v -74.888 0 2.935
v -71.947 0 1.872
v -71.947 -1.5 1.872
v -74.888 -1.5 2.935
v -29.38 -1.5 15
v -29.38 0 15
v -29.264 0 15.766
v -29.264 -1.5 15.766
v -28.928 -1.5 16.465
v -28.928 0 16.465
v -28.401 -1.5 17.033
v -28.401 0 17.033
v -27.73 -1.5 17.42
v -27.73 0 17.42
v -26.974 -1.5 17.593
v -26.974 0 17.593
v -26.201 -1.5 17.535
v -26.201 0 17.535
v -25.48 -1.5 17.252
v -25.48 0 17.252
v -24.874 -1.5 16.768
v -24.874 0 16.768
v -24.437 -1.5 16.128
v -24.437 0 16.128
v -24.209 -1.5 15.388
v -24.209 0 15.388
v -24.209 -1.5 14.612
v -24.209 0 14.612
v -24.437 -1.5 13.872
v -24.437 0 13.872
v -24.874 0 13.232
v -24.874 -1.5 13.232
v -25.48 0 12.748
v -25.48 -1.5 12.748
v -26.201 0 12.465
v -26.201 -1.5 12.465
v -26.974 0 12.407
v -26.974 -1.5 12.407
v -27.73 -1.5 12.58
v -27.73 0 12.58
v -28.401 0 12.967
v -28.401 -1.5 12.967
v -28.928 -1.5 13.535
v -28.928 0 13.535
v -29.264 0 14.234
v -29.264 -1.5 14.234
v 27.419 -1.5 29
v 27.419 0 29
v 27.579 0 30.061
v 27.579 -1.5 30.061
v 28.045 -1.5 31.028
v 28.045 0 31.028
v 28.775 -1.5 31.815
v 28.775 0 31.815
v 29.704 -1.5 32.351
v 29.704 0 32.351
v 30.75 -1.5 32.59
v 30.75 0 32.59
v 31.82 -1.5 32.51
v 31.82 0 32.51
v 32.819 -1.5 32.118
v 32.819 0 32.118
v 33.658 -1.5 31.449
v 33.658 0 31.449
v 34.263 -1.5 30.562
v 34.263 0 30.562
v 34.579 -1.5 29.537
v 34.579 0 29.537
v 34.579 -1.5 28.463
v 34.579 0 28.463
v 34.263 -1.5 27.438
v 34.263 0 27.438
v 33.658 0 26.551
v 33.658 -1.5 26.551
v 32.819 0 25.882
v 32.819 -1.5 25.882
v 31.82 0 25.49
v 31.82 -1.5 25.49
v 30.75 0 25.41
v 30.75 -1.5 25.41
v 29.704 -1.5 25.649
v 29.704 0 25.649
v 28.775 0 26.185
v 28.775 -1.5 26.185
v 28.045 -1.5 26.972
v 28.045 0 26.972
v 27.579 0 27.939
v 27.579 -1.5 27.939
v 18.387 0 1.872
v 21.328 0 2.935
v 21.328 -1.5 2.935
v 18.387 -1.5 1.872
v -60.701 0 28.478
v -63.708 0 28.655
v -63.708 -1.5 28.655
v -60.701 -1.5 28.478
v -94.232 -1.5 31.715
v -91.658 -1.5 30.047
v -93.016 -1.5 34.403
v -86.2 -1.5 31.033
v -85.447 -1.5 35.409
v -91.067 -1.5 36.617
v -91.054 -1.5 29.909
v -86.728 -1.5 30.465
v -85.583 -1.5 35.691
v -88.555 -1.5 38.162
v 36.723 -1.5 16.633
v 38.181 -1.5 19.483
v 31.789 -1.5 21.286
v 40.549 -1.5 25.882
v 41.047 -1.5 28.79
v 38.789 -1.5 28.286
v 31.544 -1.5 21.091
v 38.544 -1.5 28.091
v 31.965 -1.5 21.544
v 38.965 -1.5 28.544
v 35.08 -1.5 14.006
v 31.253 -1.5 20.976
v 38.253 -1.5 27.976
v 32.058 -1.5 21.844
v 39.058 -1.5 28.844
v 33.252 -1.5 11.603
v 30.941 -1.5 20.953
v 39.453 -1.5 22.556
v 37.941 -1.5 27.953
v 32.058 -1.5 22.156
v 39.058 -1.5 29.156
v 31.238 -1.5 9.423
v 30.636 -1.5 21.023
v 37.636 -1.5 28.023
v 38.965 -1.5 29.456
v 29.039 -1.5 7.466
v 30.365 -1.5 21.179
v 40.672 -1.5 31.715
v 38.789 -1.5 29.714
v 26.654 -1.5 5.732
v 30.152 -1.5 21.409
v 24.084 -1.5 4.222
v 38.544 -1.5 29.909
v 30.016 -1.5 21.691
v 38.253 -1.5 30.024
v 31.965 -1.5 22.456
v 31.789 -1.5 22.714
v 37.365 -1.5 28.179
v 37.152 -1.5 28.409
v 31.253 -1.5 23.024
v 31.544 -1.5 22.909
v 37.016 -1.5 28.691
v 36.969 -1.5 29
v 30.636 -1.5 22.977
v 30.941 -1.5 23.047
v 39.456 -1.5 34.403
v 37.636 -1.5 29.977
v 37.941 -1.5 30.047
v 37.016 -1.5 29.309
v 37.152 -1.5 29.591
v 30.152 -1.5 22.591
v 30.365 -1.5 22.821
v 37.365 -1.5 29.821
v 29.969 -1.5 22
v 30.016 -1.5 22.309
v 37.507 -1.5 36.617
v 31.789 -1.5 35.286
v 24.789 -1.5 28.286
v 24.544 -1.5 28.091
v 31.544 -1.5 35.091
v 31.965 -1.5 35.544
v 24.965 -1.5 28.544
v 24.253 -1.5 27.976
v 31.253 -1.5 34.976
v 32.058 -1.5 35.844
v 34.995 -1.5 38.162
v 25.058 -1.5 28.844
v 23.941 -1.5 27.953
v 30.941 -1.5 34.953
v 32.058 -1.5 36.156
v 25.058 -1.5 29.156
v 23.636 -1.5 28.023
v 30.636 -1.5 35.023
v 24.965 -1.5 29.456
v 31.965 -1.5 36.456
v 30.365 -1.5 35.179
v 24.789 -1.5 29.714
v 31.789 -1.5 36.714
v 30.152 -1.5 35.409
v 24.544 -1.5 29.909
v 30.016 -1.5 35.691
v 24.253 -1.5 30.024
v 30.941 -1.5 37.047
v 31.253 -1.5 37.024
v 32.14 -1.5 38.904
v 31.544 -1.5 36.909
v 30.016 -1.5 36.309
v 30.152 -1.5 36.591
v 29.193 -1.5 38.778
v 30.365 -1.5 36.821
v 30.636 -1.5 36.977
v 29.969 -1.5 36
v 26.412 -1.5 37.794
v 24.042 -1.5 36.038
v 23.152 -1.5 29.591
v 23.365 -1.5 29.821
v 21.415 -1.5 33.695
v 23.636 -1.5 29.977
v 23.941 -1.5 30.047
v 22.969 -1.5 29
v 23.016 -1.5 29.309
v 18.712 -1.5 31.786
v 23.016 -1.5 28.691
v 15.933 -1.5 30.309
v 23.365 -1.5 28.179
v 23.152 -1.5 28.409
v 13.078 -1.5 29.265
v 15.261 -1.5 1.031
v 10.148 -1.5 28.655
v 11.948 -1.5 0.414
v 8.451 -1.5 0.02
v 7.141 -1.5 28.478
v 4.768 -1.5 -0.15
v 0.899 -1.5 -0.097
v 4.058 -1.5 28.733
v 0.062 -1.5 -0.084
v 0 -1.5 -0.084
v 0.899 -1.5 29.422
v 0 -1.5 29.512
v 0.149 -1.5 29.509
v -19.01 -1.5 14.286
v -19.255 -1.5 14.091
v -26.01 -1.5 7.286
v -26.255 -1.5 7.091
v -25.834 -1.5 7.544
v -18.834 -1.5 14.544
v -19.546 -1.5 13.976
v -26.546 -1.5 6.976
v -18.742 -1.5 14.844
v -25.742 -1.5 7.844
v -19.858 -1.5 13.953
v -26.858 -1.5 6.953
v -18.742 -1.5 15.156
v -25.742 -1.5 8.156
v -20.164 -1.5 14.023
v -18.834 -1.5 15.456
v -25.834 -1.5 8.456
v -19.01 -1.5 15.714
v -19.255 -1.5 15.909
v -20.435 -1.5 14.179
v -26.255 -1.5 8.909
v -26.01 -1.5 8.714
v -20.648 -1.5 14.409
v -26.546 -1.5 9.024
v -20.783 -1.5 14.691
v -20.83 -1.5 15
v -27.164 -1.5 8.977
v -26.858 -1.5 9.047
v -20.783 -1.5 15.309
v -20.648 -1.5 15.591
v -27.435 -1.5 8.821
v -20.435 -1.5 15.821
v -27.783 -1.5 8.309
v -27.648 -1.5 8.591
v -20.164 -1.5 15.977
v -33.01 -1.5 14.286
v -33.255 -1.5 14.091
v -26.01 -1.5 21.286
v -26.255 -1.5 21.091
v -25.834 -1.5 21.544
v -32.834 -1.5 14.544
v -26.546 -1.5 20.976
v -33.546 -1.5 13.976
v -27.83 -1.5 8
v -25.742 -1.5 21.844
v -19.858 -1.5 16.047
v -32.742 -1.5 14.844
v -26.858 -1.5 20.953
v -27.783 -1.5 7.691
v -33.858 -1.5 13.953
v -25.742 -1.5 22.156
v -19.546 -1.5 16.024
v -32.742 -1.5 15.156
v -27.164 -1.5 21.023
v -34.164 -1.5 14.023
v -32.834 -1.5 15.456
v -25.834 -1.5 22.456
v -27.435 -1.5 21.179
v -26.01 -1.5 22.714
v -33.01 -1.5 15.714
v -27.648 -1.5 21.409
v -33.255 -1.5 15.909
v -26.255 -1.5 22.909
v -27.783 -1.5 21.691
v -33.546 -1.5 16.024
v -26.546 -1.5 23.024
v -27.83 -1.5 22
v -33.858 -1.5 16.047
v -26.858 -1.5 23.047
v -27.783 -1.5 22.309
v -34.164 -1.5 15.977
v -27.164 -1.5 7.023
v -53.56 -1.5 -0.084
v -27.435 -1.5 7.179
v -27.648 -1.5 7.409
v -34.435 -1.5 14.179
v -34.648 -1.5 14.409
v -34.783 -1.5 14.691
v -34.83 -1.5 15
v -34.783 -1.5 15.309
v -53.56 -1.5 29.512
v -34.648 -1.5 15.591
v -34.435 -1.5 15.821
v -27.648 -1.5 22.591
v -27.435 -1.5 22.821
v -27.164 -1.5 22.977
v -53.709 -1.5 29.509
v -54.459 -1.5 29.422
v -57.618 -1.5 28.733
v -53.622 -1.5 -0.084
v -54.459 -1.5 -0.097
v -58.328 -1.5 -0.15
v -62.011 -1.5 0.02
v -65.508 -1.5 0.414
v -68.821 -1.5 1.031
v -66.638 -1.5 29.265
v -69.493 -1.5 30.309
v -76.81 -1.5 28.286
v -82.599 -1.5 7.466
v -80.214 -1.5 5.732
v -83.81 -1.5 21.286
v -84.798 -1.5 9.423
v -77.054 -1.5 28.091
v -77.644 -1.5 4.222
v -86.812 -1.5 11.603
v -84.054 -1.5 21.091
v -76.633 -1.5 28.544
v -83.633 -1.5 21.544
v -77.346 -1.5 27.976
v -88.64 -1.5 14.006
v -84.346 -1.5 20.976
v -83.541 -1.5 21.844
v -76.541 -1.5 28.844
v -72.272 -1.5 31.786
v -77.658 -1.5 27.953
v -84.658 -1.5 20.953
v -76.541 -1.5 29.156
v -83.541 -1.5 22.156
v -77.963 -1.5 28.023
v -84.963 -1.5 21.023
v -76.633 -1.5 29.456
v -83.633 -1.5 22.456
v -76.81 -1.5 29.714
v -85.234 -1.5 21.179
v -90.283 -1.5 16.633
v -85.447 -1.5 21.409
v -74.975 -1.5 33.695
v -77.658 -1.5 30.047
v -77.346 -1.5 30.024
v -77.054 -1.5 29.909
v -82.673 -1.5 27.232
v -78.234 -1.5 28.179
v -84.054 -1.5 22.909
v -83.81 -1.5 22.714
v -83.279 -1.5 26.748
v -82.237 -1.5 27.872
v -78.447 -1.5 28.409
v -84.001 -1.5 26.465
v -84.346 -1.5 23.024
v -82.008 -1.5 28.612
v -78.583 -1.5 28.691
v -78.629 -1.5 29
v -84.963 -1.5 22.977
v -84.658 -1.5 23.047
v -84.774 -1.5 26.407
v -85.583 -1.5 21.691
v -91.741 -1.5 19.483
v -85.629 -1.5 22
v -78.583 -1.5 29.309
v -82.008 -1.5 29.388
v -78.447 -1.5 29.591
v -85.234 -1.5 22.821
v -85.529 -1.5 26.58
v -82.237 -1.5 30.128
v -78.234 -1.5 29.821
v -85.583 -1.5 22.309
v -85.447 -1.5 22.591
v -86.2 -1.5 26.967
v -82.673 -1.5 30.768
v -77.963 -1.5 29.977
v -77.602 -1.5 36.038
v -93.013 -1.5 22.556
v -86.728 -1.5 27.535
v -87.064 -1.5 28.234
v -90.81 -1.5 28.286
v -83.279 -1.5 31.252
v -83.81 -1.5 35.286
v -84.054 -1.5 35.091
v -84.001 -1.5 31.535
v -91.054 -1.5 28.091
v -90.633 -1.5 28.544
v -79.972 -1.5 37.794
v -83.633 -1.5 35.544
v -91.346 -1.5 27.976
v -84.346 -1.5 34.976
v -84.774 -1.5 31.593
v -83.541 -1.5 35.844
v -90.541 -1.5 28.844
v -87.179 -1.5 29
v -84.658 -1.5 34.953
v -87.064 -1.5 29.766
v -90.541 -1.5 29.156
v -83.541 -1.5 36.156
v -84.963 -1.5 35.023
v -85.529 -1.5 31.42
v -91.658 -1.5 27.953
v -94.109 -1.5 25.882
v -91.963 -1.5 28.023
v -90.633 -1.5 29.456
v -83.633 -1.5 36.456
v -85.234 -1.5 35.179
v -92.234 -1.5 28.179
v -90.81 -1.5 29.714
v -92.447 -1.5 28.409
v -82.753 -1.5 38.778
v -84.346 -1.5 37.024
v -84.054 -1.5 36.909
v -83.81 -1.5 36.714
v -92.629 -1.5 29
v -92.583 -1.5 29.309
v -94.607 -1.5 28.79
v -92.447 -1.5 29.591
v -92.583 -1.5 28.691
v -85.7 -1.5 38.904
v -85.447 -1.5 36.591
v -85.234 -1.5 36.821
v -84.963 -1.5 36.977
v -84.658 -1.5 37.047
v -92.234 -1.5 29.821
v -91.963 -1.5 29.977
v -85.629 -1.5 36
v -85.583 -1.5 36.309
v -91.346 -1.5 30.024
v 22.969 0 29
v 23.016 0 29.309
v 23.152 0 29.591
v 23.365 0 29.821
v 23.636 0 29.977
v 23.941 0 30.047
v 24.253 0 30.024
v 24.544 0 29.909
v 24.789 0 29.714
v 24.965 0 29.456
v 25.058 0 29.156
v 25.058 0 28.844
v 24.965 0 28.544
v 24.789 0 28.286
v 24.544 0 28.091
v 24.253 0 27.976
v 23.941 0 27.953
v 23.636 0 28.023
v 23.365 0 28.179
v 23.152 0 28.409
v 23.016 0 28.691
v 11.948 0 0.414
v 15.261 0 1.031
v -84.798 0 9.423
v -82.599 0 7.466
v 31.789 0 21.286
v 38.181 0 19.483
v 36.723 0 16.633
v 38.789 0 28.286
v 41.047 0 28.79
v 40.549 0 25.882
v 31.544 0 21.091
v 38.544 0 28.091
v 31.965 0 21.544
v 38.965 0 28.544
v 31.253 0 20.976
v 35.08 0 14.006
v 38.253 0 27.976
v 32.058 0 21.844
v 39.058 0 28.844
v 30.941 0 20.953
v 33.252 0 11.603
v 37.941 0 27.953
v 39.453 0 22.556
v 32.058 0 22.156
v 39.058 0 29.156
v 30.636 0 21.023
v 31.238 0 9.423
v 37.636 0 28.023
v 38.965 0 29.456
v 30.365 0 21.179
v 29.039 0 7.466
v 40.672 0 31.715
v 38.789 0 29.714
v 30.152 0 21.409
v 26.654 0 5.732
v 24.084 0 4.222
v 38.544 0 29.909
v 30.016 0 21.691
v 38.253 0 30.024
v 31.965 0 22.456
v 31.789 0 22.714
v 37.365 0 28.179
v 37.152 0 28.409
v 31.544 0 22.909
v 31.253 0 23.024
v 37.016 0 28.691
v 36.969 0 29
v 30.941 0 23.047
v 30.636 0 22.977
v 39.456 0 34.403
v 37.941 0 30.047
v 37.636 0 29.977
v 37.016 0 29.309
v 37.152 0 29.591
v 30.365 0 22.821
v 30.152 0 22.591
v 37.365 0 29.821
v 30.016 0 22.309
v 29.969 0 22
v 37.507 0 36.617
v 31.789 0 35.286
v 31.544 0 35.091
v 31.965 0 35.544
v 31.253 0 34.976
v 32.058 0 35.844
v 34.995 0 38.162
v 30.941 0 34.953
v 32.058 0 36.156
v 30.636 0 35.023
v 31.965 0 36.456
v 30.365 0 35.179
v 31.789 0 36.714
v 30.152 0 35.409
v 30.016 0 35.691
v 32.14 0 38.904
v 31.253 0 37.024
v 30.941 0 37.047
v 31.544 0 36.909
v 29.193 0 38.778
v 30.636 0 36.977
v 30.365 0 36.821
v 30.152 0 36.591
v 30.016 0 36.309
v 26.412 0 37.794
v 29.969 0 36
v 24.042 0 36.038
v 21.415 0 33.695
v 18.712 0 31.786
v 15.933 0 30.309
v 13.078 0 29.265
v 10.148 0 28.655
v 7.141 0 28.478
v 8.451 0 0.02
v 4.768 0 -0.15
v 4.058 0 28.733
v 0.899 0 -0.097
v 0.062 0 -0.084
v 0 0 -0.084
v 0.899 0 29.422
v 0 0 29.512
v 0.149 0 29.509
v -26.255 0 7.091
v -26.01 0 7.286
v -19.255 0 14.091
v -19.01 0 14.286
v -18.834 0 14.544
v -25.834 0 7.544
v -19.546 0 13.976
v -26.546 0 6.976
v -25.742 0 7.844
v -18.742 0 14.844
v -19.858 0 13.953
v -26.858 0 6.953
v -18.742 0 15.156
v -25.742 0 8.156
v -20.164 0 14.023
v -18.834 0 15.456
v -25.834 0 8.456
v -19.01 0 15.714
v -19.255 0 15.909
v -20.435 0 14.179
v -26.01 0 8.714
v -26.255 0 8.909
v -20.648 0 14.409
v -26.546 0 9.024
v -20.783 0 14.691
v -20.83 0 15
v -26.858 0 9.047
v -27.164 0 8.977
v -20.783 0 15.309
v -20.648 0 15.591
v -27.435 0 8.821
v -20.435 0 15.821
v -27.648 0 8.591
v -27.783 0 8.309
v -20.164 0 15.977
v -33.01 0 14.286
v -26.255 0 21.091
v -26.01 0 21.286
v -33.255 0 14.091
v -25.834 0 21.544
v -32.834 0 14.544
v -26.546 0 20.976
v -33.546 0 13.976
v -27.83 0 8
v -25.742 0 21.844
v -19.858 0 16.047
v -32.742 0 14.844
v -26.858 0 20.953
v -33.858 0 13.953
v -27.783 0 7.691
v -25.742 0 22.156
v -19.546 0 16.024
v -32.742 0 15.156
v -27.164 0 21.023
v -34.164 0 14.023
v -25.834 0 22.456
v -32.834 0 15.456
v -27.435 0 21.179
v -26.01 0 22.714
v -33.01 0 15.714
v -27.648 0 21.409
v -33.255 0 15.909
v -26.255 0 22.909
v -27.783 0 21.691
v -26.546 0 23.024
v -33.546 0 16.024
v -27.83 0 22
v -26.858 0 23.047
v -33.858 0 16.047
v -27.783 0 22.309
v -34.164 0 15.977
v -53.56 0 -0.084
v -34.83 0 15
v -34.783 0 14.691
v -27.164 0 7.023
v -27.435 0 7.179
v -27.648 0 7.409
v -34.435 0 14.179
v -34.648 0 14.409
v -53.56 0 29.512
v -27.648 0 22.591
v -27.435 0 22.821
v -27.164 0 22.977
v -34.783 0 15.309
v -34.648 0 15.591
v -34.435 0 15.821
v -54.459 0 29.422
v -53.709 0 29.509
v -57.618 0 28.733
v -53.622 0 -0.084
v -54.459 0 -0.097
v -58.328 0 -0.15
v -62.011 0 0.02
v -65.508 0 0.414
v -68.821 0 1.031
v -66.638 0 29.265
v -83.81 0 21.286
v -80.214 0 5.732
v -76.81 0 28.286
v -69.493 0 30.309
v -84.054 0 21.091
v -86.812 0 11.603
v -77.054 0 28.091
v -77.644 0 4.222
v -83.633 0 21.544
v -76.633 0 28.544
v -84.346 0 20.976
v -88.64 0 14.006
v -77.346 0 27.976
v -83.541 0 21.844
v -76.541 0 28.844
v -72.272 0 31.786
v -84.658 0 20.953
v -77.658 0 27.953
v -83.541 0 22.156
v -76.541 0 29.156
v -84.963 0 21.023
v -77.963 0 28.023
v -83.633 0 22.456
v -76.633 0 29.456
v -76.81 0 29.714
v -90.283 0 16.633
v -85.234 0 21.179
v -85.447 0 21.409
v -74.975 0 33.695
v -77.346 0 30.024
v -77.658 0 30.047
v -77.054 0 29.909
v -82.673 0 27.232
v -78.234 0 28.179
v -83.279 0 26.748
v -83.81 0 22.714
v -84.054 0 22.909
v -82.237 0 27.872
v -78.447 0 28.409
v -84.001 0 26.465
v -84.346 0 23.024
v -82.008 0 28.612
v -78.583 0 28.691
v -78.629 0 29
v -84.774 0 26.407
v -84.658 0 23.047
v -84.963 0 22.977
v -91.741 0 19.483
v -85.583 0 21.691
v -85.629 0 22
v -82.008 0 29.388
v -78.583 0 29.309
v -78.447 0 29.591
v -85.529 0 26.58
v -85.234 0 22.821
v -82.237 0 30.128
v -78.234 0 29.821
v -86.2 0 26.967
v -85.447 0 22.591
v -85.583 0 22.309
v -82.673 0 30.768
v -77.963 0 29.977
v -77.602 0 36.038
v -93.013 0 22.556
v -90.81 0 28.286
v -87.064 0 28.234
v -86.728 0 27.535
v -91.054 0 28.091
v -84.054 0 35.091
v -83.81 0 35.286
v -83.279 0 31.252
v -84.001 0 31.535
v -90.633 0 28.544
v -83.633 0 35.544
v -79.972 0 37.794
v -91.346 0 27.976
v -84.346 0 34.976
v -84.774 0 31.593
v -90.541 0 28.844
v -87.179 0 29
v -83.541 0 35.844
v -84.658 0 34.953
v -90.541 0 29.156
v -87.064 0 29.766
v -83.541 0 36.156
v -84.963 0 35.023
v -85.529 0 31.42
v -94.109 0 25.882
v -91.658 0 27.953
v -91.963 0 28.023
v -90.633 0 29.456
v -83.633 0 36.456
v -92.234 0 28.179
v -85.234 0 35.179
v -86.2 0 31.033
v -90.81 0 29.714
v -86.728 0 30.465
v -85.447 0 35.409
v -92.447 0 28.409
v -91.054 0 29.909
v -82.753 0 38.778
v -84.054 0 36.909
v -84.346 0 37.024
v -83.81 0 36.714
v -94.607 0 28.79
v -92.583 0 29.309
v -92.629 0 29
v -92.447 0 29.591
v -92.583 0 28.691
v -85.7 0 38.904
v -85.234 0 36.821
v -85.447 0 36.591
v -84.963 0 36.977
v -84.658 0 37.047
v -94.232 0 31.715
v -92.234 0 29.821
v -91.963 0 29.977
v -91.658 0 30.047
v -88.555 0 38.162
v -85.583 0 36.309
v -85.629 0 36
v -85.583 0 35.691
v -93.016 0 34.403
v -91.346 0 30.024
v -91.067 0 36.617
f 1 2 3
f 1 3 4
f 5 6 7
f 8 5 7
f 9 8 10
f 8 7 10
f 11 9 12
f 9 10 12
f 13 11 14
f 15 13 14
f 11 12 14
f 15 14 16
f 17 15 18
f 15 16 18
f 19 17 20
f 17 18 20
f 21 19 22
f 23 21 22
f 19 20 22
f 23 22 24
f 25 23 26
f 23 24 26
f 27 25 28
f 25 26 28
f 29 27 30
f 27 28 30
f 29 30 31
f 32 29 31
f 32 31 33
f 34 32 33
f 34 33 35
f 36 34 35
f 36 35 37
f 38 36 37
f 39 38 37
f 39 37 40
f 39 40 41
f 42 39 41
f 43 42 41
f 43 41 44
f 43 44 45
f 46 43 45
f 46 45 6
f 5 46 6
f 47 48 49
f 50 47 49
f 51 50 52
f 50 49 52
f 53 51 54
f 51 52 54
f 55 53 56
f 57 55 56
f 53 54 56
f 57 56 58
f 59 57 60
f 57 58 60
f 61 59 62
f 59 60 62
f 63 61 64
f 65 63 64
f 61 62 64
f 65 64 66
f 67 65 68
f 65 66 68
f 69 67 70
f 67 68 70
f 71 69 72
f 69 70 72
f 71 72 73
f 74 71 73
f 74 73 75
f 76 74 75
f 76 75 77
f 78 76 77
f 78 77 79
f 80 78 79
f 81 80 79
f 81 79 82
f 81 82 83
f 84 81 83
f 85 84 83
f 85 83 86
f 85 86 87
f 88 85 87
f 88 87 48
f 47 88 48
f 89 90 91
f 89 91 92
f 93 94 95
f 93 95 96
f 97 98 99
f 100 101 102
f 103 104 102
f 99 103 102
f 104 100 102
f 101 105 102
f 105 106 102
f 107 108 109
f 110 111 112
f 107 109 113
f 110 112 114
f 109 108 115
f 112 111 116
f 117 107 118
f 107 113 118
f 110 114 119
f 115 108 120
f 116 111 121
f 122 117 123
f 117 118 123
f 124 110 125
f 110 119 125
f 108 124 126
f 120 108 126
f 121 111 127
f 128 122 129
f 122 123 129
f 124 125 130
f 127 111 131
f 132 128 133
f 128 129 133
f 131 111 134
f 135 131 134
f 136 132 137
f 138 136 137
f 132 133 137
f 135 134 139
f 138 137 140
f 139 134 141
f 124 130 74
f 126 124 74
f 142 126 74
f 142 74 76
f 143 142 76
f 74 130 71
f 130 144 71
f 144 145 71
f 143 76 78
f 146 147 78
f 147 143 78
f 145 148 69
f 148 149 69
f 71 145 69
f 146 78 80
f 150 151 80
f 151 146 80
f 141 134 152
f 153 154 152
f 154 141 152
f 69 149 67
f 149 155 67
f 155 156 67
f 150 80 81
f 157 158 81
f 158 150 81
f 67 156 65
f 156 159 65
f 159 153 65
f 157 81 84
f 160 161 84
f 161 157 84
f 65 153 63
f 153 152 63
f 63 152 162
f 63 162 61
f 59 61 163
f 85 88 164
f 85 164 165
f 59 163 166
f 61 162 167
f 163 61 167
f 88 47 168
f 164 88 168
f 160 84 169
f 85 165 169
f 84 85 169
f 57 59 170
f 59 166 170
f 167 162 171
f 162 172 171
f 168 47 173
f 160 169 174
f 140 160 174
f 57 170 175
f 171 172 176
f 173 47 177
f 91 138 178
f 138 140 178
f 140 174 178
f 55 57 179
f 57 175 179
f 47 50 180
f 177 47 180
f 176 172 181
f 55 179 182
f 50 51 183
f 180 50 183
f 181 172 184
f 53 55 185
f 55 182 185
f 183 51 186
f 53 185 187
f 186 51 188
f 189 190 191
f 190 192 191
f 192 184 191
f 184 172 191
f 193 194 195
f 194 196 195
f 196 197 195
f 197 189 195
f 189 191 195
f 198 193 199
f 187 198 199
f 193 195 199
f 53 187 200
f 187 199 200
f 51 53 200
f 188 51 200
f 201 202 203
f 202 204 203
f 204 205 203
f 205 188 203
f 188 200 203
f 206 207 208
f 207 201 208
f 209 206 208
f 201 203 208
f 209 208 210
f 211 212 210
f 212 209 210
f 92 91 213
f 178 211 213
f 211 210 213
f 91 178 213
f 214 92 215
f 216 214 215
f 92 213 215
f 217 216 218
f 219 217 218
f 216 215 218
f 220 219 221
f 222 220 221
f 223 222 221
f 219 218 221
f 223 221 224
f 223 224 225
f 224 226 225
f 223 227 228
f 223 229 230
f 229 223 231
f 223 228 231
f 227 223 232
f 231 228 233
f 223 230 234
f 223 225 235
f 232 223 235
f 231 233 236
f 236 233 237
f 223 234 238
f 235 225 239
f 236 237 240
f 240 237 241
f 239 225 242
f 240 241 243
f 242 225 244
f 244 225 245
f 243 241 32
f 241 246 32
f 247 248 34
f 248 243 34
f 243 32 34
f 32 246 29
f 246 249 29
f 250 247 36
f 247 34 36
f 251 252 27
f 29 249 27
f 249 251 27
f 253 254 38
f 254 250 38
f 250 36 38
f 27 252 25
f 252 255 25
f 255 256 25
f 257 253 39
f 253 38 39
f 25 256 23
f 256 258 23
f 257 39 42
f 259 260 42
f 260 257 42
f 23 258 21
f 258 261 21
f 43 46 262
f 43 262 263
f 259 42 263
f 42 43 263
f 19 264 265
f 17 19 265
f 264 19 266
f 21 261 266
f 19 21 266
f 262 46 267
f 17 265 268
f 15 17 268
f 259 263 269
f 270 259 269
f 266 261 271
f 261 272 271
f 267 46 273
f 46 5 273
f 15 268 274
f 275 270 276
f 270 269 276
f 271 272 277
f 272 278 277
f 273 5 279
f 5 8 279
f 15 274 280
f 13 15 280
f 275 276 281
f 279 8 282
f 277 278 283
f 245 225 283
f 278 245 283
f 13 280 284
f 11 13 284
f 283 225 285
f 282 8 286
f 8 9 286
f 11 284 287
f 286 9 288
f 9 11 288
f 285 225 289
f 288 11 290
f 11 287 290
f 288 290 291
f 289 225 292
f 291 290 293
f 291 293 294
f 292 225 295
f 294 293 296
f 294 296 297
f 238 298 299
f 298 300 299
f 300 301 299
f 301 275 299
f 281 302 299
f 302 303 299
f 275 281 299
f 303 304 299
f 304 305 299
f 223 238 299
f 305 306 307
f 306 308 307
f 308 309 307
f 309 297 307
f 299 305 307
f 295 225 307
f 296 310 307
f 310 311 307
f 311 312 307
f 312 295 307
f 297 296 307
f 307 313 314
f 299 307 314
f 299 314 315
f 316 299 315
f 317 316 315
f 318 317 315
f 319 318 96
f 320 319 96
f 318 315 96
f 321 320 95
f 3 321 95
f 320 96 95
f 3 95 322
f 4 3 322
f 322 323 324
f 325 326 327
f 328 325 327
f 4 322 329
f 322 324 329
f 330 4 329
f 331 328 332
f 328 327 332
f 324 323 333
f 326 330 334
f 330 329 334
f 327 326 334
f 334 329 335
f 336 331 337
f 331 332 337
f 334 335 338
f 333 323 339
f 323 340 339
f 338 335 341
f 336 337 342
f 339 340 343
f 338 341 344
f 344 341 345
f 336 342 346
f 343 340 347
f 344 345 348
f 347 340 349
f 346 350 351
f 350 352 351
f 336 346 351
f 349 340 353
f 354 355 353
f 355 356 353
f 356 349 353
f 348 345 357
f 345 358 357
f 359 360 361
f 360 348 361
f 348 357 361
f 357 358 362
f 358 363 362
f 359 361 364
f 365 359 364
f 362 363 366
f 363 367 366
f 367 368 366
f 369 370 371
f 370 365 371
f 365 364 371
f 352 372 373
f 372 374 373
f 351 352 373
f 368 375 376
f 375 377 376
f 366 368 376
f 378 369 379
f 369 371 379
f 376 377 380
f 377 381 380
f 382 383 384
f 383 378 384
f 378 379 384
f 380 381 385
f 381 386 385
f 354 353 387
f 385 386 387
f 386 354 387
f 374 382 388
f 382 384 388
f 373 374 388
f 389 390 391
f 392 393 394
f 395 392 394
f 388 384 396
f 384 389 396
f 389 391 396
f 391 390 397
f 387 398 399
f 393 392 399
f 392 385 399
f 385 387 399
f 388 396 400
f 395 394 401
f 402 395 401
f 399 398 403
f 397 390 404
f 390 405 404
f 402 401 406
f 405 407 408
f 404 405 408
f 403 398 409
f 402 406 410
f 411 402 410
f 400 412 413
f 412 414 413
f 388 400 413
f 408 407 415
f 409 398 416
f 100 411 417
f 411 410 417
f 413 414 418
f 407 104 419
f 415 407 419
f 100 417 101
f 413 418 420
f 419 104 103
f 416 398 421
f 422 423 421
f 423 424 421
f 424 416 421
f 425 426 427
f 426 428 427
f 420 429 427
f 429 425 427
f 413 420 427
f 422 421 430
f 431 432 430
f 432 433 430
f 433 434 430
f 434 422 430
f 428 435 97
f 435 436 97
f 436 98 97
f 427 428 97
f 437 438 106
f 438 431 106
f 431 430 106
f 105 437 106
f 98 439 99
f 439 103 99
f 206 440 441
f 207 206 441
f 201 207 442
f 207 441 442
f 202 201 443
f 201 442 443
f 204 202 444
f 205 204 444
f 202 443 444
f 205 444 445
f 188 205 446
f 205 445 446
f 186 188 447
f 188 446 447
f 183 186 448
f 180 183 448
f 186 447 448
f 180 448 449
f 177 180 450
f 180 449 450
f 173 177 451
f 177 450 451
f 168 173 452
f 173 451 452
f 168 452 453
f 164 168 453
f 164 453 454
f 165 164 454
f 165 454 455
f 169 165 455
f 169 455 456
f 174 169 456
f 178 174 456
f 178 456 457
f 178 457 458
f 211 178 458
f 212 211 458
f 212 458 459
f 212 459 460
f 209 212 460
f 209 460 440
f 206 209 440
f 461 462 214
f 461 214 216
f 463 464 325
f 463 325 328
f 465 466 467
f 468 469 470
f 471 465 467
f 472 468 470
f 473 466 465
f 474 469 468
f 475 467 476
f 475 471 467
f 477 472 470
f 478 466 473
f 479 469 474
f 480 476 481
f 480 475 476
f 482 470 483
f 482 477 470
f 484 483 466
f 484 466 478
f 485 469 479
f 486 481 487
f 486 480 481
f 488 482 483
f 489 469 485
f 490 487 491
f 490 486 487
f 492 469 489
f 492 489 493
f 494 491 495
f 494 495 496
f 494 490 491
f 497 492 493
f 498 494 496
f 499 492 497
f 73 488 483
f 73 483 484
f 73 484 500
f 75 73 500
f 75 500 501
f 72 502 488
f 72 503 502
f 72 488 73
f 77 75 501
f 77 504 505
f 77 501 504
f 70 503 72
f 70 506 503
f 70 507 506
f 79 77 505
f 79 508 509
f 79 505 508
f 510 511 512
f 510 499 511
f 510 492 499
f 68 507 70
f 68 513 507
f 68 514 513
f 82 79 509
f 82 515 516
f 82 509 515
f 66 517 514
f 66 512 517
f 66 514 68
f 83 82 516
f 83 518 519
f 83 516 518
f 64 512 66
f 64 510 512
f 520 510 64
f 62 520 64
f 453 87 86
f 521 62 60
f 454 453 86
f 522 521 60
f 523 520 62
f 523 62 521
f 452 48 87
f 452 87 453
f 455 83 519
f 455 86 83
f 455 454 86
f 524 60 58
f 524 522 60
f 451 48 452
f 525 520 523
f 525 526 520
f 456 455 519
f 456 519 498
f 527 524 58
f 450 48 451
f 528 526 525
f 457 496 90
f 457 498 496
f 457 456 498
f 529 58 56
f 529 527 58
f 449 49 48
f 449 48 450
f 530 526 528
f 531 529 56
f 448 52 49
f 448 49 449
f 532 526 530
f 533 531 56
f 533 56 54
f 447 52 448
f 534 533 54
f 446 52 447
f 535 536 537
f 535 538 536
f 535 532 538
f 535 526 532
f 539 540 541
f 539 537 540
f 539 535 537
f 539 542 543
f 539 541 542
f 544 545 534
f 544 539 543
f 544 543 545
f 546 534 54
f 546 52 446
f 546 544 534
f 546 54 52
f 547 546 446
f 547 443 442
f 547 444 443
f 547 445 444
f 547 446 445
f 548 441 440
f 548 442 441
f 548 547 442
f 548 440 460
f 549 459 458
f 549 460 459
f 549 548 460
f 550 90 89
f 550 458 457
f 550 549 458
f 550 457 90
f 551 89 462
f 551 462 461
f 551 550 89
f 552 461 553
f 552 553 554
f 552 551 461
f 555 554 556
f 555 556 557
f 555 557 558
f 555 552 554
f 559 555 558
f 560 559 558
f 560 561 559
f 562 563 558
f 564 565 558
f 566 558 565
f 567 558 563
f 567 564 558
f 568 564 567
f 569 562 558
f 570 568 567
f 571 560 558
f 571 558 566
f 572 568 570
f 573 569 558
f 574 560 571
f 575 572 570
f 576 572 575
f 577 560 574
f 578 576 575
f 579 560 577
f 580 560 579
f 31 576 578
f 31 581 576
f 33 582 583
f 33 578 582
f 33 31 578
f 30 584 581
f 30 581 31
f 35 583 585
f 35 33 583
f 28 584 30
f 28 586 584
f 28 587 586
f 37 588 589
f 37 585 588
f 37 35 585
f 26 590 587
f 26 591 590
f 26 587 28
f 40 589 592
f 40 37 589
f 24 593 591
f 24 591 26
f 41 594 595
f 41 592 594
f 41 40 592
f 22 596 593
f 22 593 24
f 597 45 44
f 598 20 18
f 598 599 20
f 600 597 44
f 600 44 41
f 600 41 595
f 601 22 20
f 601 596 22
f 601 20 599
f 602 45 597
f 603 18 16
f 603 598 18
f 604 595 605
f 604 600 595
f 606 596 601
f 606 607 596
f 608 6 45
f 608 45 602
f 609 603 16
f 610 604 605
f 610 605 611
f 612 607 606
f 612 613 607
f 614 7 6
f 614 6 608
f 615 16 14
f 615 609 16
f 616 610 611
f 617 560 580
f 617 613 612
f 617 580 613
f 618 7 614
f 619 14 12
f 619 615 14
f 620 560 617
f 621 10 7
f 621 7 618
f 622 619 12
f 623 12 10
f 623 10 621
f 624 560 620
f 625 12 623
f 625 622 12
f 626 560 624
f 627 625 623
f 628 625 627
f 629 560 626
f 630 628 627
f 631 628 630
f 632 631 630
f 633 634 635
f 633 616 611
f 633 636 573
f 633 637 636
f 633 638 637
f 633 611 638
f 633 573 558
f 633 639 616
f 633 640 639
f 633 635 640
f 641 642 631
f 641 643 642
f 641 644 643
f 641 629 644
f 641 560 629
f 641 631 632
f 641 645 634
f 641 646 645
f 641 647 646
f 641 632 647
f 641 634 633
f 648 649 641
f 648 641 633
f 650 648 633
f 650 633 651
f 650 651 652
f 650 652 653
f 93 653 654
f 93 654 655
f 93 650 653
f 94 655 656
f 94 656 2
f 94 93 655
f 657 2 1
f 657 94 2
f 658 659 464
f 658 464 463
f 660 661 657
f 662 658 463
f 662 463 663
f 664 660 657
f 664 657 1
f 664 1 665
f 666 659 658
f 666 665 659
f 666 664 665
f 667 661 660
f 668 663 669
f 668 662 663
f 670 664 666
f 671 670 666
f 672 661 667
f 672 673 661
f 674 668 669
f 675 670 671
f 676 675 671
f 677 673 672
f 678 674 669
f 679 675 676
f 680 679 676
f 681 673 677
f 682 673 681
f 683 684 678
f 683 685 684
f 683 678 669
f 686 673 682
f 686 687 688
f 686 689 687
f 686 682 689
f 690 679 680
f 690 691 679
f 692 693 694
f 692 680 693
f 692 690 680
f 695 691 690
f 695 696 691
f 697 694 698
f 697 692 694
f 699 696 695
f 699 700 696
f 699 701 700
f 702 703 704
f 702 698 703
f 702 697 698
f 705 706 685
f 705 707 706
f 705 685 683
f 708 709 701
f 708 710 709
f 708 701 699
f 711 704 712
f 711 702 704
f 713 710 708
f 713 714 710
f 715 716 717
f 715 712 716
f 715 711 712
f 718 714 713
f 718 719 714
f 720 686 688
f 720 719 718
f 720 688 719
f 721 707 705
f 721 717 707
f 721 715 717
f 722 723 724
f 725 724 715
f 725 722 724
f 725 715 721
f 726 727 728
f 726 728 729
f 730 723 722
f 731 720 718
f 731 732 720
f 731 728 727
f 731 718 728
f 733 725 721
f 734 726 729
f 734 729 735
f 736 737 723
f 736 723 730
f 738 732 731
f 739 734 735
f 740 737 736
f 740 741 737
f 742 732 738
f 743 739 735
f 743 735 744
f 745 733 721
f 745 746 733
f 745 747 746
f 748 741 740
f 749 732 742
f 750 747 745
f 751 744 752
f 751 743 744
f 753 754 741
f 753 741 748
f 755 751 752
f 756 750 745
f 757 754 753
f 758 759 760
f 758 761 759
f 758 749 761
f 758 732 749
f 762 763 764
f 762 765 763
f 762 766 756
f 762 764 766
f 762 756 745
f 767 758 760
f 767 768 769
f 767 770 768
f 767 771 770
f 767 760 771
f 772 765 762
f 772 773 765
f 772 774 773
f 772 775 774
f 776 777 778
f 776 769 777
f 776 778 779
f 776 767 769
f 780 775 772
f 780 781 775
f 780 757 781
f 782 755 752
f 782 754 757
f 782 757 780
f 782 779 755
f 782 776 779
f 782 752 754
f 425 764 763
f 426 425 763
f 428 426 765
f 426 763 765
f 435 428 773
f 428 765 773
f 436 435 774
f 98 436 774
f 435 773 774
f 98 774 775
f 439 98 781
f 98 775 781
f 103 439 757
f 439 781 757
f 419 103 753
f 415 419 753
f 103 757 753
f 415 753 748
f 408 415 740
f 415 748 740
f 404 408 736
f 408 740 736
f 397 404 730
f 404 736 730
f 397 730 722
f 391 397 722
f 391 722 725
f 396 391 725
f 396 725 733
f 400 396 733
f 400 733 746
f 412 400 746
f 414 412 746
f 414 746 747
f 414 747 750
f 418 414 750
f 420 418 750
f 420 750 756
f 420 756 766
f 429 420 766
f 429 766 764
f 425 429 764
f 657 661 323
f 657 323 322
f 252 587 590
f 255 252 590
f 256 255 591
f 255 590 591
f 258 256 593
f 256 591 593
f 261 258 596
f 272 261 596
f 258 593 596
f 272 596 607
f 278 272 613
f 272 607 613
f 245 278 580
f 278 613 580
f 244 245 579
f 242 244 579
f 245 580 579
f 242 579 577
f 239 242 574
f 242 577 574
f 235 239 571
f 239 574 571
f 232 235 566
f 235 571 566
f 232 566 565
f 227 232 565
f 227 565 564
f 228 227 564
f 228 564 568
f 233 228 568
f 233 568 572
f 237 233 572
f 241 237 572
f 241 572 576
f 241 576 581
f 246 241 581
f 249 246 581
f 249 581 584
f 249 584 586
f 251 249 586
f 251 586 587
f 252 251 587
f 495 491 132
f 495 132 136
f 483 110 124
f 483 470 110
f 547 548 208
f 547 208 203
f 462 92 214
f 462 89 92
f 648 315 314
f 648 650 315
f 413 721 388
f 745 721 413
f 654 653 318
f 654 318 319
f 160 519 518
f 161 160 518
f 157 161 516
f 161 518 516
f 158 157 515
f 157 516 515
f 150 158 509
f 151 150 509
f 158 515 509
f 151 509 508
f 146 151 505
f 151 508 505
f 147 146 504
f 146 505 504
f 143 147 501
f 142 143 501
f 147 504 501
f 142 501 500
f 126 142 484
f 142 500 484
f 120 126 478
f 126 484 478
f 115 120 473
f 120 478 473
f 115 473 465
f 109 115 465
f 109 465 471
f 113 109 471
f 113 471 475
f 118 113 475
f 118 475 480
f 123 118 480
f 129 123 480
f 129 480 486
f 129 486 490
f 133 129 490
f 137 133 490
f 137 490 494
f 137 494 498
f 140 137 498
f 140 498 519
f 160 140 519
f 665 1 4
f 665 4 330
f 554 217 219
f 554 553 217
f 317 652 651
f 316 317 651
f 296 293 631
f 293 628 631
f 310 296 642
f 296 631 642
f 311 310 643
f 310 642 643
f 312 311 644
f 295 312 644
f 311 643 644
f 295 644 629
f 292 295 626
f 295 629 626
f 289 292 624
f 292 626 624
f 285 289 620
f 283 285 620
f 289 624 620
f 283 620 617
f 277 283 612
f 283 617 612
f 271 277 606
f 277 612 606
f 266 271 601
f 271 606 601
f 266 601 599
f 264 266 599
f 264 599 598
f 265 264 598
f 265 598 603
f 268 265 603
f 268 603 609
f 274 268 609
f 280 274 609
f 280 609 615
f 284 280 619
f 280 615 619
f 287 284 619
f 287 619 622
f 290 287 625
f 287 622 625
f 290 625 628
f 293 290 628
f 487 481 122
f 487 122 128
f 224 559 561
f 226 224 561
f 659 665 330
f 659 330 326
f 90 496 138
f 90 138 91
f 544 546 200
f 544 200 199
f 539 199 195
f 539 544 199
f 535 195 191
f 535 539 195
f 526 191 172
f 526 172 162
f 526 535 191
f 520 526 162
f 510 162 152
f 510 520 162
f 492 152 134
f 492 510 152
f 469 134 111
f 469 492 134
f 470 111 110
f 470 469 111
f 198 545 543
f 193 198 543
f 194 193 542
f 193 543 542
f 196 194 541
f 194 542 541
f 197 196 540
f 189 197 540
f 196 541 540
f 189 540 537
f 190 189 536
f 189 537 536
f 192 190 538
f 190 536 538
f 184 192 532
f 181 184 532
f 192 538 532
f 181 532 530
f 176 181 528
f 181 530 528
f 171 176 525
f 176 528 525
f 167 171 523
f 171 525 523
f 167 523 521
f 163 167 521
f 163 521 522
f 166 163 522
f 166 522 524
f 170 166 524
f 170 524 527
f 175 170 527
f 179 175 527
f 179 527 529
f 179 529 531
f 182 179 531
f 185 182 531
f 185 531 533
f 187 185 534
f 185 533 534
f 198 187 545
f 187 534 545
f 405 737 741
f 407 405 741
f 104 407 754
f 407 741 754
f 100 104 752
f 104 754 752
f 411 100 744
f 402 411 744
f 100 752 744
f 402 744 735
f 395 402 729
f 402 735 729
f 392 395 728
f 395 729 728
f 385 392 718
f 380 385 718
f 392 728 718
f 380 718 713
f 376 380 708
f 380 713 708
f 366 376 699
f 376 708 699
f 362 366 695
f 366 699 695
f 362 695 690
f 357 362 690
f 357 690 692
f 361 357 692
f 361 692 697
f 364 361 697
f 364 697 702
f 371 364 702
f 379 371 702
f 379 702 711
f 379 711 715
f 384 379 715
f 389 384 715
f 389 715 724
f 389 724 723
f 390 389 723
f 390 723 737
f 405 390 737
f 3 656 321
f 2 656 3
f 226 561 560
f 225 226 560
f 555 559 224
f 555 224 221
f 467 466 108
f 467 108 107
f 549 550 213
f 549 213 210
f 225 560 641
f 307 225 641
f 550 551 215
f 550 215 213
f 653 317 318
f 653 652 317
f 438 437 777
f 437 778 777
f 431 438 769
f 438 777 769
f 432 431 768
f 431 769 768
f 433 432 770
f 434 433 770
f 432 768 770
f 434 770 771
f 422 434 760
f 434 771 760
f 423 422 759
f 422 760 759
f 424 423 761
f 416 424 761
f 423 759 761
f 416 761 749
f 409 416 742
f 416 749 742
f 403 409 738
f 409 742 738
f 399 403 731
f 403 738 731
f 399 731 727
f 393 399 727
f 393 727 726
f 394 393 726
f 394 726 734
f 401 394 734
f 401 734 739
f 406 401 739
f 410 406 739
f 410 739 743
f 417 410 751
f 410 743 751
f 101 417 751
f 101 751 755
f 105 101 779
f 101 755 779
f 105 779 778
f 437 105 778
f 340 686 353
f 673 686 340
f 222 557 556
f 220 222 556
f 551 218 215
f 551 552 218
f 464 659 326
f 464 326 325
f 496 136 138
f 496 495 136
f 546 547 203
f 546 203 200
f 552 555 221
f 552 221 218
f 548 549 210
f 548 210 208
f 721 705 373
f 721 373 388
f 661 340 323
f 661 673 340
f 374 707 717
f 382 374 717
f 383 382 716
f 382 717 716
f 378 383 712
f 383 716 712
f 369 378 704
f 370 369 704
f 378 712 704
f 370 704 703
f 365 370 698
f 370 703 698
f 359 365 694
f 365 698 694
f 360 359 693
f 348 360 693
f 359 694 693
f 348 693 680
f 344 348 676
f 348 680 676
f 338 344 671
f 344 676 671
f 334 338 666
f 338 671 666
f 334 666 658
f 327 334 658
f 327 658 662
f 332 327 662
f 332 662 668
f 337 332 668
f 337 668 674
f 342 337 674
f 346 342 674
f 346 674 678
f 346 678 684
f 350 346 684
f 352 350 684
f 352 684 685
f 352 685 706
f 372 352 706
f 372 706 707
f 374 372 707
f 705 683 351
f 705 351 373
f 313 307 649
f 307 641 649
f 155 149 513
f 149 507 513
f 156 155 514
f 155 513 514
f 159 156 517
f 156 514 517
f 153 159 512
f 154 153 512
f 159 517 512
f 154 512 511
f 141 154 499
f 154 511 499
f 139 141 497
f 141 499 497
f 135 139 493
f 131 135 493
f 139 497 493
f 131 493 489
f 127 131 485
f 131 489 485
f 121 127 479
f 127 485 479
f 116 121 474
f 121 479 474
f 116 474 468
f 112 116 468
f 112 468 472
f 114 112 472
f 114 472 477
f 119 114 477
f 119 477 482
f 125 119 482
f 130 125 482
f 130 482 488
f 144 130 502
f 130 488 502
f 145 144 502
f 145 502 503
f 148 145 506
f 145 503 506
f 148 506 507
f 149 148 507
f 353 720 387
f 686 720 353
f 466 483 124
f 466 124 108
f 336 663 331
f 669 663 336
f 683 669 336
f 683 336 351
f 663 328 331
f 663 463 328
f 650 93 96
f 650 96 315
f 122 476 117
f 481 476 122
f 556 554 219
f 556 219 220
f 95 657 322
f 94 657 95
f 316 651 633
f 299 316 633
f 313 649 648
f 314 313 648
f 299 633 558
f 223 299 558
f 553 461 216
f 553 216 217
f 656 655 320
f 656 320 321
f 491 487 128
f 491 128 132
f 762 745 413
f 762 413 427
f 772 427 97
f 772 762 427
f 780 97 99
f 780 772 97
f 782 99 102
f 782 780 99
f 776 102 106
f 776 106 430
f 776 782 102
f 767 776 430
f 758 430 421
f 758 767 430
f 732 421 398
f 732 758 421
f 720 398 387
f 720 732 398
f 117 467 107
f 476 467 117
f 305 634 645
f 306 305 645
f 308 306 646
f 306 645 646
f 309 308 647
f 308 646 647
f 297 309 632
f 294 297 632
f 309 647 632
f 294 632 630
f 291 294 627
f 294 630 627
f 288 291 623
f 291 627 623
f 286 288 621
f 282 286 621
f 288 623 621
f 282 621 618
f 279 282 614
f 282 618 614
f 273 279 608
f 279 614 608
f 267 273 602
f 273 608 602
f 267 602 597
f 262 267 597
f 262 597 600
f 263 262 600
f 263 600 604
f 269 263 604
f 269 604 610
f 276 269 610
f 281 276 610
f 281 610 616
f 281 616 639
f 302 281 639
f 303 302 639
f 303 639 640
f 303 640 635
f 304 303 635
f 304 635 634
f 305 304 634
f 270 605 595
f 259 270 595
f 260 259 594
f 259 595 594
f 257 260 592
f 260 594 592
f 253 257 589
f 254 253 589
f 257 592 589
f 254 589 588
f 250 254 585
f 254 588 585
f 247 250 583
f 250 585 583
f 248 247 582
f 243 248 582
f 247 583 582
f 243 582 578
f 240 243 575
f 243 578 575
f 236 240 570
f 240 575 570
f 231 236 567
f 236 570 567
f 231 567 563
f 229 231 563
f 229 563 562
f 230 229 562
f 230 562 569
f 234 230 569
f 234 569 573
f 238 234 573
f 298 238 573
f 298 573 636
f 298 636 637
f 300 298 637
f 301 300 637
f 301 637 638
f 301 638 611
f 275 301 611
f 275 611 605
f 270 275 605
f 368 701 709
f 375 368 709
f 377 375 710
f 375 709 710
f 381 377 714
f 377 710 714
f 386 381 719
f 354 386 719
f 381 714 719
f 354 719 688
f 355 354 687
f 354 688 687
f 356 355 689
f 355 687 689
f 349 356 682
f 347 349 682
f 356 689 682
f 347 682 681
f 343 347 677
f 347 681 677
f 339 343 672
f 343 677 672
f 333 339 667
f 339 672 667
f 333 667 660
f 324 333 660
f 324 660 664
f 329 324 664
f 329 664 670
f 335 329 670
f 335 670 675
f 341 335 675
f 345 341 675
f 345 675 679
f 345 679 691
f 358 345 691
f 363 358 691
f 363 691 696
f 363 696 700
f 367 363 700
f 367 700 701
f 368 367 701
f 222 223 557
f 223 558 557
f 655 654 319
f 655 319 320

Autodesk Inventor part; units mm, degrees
ref_plane "YZ Plane" through (0, 0, 0) normal (1, 0, 0) x (0, 1, 0)
ref_plane "XZ Plane" through (0, 0, 0) normal (0, 1, 0) x (-1, 0, 0)
ref_plane "XY Plane" through (0, 0, 0) normal (0, 0, 1) x (1, 0, 0)
sketch "Sketch1" plane through (0, 0, 0) normal (0, 1, 0) x (-1, 0, 0)
  line L0 (-0.4496, 29.8144) -> (-0.4496, -0.0878)
  line L1 (54.0096, -0.0338) -> (54.0096, 29.8144)
  line L2 (53.5706, 0) -> (53.6221, -0.0838)
  line L3 (53.56, 0) -> (53.5706, 0)
  line L4 (53.56, -0.0837) -> (53.56, 0)
  line L5 (-0.0106, 0) -> (-0.0621, -0.0838)
  line L6 (-0.8993, -0.0972) -> (-0.0106, 0)
  line L7 (53.5706, 0) -> (54.4593, -0.0972)
  line L8 (0, 0) -> (0, -0.0837)
  line L9 (-0.0106, 0) -> (0, 0)
  line L10 (0, 0) -> (53.56, 0)
  line L11 (53.7094, 29.5089) -> (53.5853, 29.9994)
  line L12 (53.56, 29.512) -> (53.7094, 29.5089)
  line L13 (53.56, 30) -> (53.56, 29.512)
  line L14 (-0.1494, 29.5089) -> (-0.0253, 29.9994)
  line L15 (-0.8993, 29.4222) -> (-0.1494, 29.5089)
  line L16 (0, 29.512) -> (0, 30)
  line L17 (-0.1494, 29.5089) -> (0, 29.512)
  line L18 (53.7094, 29.5089) -> (54.4593, 29.4222)
  line L19 (0, 29.512) -> (53.56, 29.512)
  circle A0 centre (26.78, 15) radius 2.6
  circle A1 centre (84.5793, 29) radius 2.6
  circle A2 centre (-31.0193, 29) radius 3.6
  circle A3 centre (91.5793, 29) radius 1.05
  circle A4 centre (84.5793, 36) radius 1.05
  circle A5 centre (84.5793, 22) radius 1.05
  circle A6 centre (77.5793, 29) radius 1.05
  circle A7 centre (-38.0193, 29) radius 1.05
  circle A8 centre (-31.0193, 36) radius 1.05
  circle A9 centre (-31.0193, 22) radius 1.05
  circle A10 centre (-24.0193, 29) radius 1.05
  circle A11 centre (19.78, 15) radius 1.05
  circle A12 centre (26.78, 22) radius 1.05
  circle A13 centre (33.78, 15) radius 1.05
  circle A14 centre (26.78, 8) radius 1.05
  line L20 (53.5853, 29.9994) -> (53.56, 30)
  line L21 (53.6221, -0.0838) -> (53.56, -0.0837)
  line L22 (-0.0621, -0.0838) -> (-0.8993, -0.0972)
  line L23 (-0.0253, 29.9994) -> (-0.8993, 29.4222)
  line L24 (77.602, 36.0383) -> (74.975, 33.6954)
  line L25 (74.975, 33.6954) -> (72.272, 31.7856)
  line L26 (72.272, 31.7856) -> (69.4931, 30.3089)
  line L27 (69.4931, 30.3089) -> (66.6383, 29.2653)
  line L28 (66.6383, 29.2653) -> (63.7075, 28.6549)
  line L29 (63.7075, 28.6549) -> (60.7007, 28.4776)
  line L30 (60.7007, 28.4776) -> (57.618, 28.7333)
  line L31 (57.618, 28.7333) -> (54.4593, 29.4222)
  line L32 (54.4593, -0.0972) -> (53.6221, -0.0838)
  line L33 (-40.5487, 25.8824) -> (-39.4527, 22.5565)
  line L34 (-39.4527, 22.5565) -> (-38.1807, 19.4832)
  line L35 (-38.1807, 19.4832) -> (-36.7234, 16.6331)
  line L36 (-36.7234, 16.6331) -> (-35.0805, 14.0064)
  line L37 (-35.0805, 14.0064) -> (-33.2522, 11.6029)
  line L38 (-33.2522, 11.6029) -> (-31.2384, 9.4228)
  line L39 (-31.2384, 9.4228) -> (-29.0391, 7.4659)
  line L40 (-29.0391, 7.4659) -> (-26.6543, 5.7324)
  line L41 (-26.6543, 5.7324) -> (-24.0841, 4.2221)
  line L42 (-24.0841, 4.2221) -> (-21.3284, 2.9352)
  line L43 (-21.3284, 2.9352) -> (-18.3872, 1.8715)
  line L44 (-18.3872, 1.8715) -> (-15.2606, 1.0312)
  line L45 (-15.2606, 1.0312) -> (-11.9485, 0.4141)
  line L46 (-11.9485, 0.4141) -> (-8.4509, 0.0204)
  line L47 (-8.4509, 0.0204) -> (-4.7678, -0.1501)
  line L48 (-4.7678, -0.1501) -> (-0.8993, -0.0972)
  line L49 (0, 30) -> (-0.0253, 29.9994)
  line L50 (54.4593, -0.0972) -> (58.3278, -0.1501)
  line L51 (58.3278, -0.1501) -> (62.0109, 0.0204)
  line L52 (62.0109, 0.0204) -> (65.5085, 0.4141)
  line L53 (65.5085, 0.4141) -> (68.8206, 1.0312)
  line L54 (68.8206, 1.0312) -> (71.9472, 1.8715)
  line L55 (71.9472, 1.8715) -> (74.8884, 2.9352)
  line L56 (74.8884, 2.9352) -> (77.6441, 4.2221)
  line L57 (77.6441, 4.2221) -> (80.2143, 5.7324)
  line L58 (80.2143, 5.7324) -> (82.5991, 7.4659)
  line L59 (82.5991, 7.4659) -> (84.7984, 9.4228)
  line L60 (84.7984, 9.4228) -> (86.8122, 11.6029)
  line L61 (86.8122, 11.6029) -> (88.6405, 14.0064)
  line L62 (88.6405, 14.0064) -> (90.2834, 16.6331)
  line L63 (90.2834, 16.6331) -> (91.7407, 19.4832)
  line L64 (91.7407, 19.4832) -> (93.0127, 22.5565)
  line L65 (93.0127, 22.5565) -> (94.1087, 25.8824)
  line L66 (54.4593, 29.4222) -> (53.5853, 29.9994)
  line L67 (-0.8993, 29.4222) -> (-4.058, 28.7333)
  line L68 (-4.058, 28.7333) -> (-7.1407, 28.4776)
  line L69 (-7.1407, 28.4776) -> (-10.1475, 28.6549)
  line L70 (-10.1475, 28.6549) -> (-13.0783, 29.2653)
  line L71 (-13.0783, 29.2653) -> (-15.9331, 30.3089)
  line L72 (-15.9331, 30.3089) -> (-18.712, 31.7856)
  line L73 (-18.712, 31.7856) -> (-21.415, 33.6954)
  line L74 (-21.415, 33.6954) -> (-24.042, 36.0383)
  line L75 (0, -0.0837) -> (-0.0621, -0.0838)
  line L76 (53.56, 30) -> (0, 30)
  arc A15 (-24.042, 36.0383) -> (-40.5487, 25.8824) centre (-31.0892, 28.9999) ccw
  arc A16 (94.1087, 25.8824) -> (77.602, 36.0383) centre (84.6492, 28.9999) ccw
  line L77 (53.56, -0.0837) -> (0, -0.0837)
  line L78 (54.4593, 29.4222) -> (54.4593, -0.0972)
  line L79 (-0.8993, -0.0972) -> (-0.8993, 29.4222)
  line L80 (53.56, 0) -> (53.56, 30)
  line L81 (0, 30) -> (0, 0)
  point P0 (0, 0)
extrude "Extrusion1" add sketch "Sketch1" against normal blind 1.5 contours L15 L17 L81 L9 L6 L0 | L0 L6 L79 L15 | L79 L48 L47 L46 L45 L44 L43 L42 L41 L40 L39 L38 L37 L36 L35 L34 L33 A15 L74 L73 L72 L71 L70 L69 L68 L67 | L19 L80 L10 L81 | L12 L18 L78 L7 L3 L80 | L31 L30 L29 L28 L27 L26 L25 L24 A16 L65 L64 L63 L62 L61 L60 L59 L58 L57 L56 L55 L54 L53 L52 L51 L50 L78
extrude "Extrusion2" add sketch "Sketch1" against normal blind 1.5 contours L6 L5 L22 | L9 L8 L75 L5 | L10 L4 L77 L8 | L3 L2 L21 L4 | L7 L32 L2
sketch "Sketch2" plane through (0, 0, 0) normal (0, 1, 0) x (1, 0, 0)
  line L0 (-54.4593, -29.4222) -> (-54.4593, 0.0972) projected
  line L1 (0.8993, 0.0972) -> (0.8993, -29.4222) projected
  point P0 (0, 0)
properties part number "axis_21_bottom_frame"
